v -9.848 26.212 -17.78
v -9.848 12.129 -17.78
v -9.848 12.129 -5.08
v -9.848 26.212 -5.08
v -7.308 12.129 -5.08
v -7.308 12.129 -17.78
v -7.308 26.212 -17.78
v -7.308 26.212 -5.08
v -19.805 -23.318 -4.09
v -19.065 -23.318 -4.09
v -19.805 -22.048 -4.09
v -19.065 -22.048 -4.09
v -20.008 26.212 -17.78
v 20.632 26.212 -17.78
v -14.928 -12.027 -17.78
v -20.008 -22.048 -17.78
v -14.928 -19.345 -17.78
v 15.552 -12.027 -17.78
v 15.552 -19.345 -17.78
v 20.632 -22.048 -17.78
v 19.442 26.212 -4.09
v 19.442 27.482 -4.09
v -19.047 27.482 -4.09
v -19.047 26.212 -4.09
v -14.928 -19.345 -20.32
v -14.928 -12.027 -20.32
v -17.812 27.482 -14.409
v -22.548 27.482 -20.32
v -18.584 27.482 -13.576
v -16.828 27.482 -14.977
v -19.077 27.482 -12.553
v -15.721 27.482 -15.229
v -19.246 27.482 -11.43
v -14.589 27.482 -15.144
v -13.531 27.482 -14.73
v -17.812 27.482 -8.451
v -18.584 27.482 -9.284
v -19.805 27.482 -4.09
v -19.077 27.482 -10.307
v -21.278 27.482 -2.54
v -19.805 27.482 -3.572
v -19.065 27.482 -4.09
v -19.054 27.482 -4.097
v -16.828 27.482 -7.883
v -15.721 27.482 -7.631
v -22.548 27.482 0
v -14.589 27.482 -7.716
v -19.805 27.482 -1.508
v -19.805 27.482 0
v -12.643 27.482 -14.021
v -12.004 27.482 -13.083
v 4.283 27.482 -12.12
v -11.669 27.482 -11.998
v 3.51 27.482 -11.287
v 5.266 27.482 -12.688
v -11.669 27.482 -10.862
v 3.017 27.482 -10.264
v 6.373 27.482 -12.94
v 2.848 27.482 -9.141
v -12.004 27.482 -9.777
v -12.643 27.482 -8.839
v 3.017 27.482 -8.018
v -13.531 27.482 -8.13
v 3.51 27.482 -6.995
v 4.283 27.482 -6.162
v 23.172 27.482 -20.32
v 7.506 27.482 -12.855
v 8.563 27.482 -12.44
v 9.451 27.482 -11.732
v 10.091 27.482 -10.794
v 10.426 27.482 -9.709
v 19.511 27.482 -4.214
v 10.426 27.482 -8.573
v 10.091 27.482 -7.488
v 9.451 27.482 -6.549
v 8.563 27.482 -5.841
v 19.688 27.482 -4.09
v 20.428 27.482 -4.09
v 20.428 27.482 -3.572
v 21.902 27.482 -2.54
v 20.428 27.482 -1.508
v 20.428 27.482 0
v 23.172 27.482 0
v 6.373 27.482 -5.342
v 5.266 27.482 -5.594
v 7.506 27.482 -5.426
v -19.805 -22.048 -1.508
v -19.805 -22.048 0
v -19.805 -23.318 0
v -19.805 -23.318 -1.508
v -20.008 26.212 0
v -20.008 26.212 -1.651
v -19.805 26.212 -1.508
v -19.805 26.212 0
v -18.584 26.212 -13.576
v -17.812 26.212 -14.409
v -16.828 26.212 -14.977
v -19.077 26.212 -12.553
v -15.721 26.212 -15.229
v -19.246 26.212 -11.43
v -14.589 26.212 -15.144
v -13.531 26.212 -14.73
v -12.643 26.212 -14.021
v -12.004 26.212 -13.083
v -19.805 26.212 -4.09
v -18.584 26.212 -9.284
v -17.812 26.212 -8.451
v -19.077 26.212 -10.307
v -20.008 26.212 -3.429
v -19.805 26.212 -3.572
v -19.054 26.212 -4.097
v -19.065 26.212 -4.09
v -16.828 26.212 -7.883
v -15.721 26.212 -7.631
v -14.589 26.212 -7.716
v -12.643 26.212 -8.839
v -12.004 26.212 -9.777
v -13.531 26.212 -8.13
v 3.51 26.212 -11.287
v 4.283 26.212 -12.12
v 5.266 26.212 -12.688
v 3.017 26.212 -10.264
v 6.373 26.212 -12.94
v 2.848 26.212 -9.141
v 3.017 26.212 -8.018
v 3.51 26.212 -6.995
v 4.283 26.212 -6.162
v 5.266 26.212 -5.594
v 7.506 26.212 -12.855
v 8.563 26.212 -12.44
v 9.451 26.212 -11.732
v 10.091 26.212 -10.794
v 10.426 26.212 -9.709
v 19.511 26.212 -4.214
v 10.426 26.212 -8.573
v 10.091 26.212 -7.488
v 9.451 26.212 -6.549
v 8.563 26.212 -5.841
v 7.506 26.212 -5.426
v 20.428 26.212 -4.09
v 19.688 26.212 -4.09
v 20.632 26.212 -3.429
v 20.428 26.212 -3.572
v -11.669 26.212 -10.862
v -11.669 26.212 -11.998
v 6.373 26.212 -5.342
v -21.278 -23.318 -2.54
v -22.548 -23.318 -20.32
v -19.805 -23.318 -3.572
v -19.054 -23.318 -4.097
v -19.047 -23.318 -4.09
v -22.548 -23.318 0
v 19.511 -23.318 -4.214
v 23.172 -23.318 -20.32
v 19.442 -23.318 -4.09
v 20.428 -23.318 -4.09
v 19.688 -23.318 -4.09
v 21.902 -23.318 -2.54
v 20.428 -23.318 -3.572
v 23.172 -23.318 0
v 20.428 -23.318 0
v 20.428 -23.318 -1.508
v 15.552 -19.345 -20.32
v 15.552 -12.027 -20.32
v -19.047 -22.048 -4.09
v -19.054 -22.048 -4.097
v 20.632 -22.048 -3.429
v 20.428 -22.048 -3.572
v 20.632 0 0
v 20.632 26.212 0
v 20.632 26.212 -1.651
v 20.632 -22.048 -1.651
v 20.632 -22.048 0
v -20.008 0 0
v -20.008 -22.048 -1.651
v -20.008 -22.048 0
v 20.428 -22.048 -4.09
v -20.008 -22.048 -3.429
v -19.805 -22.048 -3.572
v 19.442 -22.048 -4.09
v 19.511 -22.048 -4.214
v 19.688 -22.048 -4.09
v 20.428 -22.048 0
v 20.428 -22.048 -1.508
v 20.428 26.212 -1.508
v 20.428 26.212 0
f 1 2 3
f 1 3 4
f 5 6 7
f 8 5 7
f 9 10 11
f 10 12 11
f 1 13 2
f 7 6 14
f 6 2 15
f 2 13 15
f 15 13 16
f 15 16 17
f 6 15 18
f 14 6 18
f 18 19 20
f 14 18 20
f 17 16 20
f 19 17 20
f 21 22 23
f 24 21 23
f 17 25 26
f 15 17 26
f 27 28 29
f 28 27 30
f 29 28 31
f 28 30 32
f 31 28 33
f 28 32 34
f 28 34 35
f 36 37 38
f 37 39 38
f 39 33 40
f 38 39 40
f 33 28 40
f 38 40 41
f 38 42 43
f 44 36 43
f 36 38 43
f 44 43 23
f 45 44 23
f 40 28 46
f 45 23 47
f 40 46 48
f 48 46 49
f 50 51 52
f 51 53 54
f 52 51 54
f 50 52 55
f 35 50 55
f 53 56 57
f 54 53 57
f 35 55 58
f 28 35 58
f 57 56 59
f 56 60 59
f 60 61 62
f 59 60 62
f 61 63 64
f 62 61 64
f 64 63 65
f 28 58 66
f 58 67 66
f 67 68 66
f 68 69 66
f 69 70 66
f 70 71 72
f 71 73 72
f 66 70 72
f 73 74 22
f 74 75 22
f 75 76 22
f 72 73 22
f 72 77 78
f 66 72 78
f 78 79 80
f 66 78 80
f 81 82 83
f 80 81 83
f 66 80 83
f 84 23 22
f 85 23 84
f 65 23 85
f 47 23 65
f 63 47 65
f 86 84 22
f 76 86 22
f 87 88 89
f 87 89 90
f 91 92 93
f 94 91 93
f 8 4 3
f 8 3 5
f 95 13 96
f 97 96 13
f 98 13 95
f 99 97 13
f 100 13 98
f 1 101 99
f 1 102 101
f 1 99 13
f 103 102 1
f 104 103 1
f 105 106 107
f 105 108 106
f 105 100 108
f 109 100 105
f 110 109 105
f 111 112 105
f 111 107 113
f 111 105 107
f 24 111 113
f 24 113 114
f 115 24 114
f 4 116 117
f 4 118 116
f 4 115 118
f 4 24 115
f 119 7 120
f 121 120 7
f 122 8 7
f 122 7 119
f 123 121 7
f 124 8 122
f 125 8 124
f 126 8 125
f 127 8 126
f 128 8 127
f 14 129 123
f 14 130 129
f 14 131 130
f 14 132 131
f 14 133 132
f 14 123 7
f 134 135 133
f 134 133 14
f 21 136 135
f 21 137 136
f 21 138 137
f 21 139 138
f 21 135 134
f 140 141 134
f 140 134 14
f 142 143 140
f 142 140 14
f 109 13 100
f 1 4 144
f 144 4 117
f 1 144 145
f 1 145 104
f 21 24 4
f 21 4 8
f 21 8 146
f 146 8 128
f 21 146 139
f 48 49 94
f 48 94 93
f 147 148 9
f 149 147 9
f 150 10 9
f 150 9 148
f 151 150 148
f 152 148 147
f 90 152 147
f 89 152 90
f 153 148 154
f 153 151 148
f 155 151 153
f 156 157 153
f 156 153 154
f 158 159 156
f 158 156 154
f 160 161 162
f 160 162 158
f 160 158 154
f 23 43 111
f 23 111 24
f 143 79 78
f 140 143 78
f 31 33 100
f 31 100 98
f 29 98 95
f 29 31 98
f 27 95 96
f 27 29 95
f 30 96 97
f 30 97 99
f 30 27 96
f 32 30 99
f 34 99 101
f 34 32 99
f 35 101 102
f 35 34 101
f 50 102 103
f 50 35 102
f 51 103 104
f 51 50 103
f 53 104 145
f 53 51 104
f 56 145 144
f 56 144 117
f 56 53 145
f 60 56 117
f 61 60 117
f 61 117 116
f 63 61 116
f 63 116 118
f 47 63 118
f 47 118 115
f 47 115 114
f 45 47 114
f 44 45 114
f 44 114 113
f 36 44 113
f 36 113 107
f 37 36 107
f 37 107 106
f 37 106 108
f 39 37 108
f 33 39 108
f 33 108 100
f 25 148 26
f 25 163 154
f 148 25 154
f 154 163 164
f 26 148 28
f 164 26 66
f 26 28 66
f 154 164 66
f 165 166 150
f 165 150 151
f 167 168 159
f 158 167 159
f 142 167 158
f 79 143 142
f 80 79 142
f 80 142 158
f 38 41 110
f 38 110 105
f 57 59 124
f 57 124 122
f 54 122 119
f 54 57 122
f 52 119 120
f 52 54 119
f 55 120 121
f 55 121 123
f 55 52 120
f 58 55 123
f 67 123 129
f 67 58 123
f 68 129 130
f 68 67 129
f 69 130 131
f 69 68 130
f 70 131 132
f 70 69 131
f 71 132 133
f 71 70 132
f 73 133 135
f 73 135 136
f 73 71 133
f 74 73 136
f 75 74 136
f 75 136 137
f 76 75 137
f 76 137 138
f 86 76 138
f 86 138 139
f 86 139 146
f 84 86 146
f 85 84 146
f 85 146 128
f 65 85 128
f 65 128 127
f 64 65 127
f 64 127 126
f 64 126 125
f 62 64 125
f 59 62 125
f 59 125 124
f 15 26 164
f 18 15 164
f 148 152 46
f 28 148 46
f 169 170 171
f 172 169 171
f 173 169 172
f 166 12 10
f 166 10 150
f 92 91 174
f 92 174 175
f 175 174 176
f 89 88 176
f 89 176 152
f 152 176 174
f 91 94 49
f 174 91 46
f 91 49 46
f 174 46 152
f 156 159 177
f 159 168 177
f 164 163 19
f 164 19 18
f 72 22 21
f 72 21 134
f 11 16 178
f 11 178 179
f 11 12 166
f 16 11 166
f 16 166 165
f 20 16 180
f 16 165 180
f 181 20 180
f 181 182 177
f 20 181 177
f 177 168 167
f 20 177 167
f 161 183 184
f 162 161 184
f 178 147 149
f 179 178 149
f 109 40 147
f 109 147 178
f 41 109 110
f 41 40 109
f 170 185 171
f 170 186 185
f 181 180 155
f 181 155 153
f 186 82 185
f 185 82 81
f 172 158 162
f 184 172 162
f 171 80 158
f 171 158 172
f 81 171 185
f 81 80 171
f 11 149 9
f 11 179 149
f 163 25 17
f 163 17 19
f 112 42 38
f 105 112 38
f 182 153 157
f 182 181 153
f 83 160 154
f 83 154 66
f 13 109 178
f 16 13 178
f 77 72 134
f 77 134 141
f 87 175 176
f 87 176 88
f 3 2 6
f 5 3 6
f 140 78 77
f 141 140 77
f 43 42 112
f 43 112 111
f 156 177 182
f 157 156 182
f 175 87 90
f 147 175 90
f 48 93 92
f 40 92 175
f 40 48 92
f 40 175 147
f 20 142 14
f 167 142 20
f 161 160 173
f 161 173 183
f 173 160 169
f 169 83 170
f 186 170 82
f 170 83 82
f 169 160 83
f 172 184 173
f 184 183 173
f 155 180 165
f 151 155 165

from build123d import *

# Parameters (mm, degrees)
F0_W      = 45.72
F0_H      = 50.8
F1_DEPTH  = 20.32
F2_W      = 40.64
F2_H      = 48.26
F3_DEPTH  = 17.78
F6_DEPTH  = 76.2
F7_W      = 40.2336
F7_H      = 13.4213150721
F8_DEPTH  = 76.2
F9_R      = 3.81
F10_DEPTH = 25.4
F11_R     = 3.81
F12_DEPTH = 25.4
F13_W     = 30.48
F13_H     = 7.3176570747
F14_DEPTH = 25.4
F16_W     = 85.4751653969
F16_H     = 36.5072973073
F17_DEPTH = 27.4827411682
F4_W      = 45.72
F4_H      = 20.32
F18_DEPTH = 1295.4
F19_W     = 2.54
F19_H     = 14.0831380416
F20_DEPTH = 12.7


with BuildPart() as f1:
    # F0 (on Top) → F1 (new body)
    with BuildSketch(Plane.XY):
        with Locations((0.3116804636, 2.0817411682)):
            Rectangle(F0_W, F0_H)
    extrude(amount=F1_DEPTH)

    # F2 (on face) → F3 (cut)
    with BuildSketch(Plane(origin=(0, 0, 0), x_dir=(1, 0, 0), z_dir=(0, 0, -1))):
        with Locations((0.3116804636, -2.0817411682)):
            Rectangle(F2_W, F2_H)
    extrude(amount=-F3_DEPTH, mode=Mode.SUBTRACT)

    # F5 (on face) → F6 (cut)
    with BuildSketch(Plane(origin=(0, 27.4817411682, 0), x_dir=(-1, 0, 0), z_dir=(0, 1, 0))):
        Polygon((7.4571696945, -7.1376733061), (21.2783195364, 2.54), (19.0544535564, 4.0971677232), align=None)
        Polygon((-16.4789422694, -1.2570421612), (-19.511084422, 4.2139133691), (-21.9016804636, 2.54), align=None)
    extrude(amount=-F6_DEPTH, mode=Mode.SUBTRACT)

    # F7 (on face) → F8 (cut)
    with BuildSketch(Plane(origin=(0, 27.4817411682, 0), x_dir=(-1, 0, 0), z_dir=(0, 1, 0))):
        with Locations((-0.3116804636, -2.6208243798)):
            Rectangle(F7_W, F7_H)
    extrude(amount=-F8_DEPTH, mode=Mode.SUBTRACT)

    # F9 (on face) → F10 (cut)
    with BuildSketch(Plane(origin=(0, 27.4817411682, 0), x_dir=(-1, 0, 0), z_dir=(0, 1, 0))):
        with Locations((-6.658220198, 9.1409003362)):
            Circle(F9_R)
    extrude(amount=-F10_DEPTH, mode=Mode.SUBTRACT)

    # F11 (on face) → F12 (cut)
    with BuildSketch(Plane(origin=(0, 27.4817411682, 0), x_dir=(-1, 0, 0), z_dir=(0, 1, 0))):
        with Locations((15.4363195364, 11.43)):
            Circle(F11_R)
    extrude(amount=-F12_DEPTH, mode=Mode.SUBTRACT)

    # F13 (on face) → F14 (cut)
    with BuildSketch(Plane.XY.offset(20.32)):
        with Locations((0.3116804636, -15.6860221177)):
            Rectangle(F13_W, F13_H)
    extrude(amount=-F14_DEPTH, mode=Mode.SUBTRACT)

    # F15: F1 across plane


with BuildPart() as f1_1:
    add(f1.part)
    add(f1.part.mirror(Plane.XY))

    # F16 (on Front) → F17 (cut, through all)
    with BuildSketch(Plane.XZ):
        with Locations((-9.5093864948, 18.2536486536)):
            Rectangle(F16_W, F16_H)
    extrude(amount=-F17_DEPTH, mode=Mode.SUBTRACT)

    # F4 (on face) → F18 (cut)
    with BuildSketch(Plane(origin=(0, 27.4817411682, 0), x_dir=(-1, 0, 0), z_dir=(0, 1, 0))):
        with Locations((-0.3116804636, 10.16)):
            Rectangle(F4_W, F4_H)
    extrude(amount=-F18_DEPTH, mode=Mode.SUBTRACT)

    # F19 (on face) → F20 (join)
    with BuildSketch(Plane.XY.offset(-17.78)):
        with Locations((-8.5783195364, 19.1701721474)):
            Rectangle(F19_W, F19_H)
    extrude(amount=F20_DEPTH)


solid = f1_1.part
